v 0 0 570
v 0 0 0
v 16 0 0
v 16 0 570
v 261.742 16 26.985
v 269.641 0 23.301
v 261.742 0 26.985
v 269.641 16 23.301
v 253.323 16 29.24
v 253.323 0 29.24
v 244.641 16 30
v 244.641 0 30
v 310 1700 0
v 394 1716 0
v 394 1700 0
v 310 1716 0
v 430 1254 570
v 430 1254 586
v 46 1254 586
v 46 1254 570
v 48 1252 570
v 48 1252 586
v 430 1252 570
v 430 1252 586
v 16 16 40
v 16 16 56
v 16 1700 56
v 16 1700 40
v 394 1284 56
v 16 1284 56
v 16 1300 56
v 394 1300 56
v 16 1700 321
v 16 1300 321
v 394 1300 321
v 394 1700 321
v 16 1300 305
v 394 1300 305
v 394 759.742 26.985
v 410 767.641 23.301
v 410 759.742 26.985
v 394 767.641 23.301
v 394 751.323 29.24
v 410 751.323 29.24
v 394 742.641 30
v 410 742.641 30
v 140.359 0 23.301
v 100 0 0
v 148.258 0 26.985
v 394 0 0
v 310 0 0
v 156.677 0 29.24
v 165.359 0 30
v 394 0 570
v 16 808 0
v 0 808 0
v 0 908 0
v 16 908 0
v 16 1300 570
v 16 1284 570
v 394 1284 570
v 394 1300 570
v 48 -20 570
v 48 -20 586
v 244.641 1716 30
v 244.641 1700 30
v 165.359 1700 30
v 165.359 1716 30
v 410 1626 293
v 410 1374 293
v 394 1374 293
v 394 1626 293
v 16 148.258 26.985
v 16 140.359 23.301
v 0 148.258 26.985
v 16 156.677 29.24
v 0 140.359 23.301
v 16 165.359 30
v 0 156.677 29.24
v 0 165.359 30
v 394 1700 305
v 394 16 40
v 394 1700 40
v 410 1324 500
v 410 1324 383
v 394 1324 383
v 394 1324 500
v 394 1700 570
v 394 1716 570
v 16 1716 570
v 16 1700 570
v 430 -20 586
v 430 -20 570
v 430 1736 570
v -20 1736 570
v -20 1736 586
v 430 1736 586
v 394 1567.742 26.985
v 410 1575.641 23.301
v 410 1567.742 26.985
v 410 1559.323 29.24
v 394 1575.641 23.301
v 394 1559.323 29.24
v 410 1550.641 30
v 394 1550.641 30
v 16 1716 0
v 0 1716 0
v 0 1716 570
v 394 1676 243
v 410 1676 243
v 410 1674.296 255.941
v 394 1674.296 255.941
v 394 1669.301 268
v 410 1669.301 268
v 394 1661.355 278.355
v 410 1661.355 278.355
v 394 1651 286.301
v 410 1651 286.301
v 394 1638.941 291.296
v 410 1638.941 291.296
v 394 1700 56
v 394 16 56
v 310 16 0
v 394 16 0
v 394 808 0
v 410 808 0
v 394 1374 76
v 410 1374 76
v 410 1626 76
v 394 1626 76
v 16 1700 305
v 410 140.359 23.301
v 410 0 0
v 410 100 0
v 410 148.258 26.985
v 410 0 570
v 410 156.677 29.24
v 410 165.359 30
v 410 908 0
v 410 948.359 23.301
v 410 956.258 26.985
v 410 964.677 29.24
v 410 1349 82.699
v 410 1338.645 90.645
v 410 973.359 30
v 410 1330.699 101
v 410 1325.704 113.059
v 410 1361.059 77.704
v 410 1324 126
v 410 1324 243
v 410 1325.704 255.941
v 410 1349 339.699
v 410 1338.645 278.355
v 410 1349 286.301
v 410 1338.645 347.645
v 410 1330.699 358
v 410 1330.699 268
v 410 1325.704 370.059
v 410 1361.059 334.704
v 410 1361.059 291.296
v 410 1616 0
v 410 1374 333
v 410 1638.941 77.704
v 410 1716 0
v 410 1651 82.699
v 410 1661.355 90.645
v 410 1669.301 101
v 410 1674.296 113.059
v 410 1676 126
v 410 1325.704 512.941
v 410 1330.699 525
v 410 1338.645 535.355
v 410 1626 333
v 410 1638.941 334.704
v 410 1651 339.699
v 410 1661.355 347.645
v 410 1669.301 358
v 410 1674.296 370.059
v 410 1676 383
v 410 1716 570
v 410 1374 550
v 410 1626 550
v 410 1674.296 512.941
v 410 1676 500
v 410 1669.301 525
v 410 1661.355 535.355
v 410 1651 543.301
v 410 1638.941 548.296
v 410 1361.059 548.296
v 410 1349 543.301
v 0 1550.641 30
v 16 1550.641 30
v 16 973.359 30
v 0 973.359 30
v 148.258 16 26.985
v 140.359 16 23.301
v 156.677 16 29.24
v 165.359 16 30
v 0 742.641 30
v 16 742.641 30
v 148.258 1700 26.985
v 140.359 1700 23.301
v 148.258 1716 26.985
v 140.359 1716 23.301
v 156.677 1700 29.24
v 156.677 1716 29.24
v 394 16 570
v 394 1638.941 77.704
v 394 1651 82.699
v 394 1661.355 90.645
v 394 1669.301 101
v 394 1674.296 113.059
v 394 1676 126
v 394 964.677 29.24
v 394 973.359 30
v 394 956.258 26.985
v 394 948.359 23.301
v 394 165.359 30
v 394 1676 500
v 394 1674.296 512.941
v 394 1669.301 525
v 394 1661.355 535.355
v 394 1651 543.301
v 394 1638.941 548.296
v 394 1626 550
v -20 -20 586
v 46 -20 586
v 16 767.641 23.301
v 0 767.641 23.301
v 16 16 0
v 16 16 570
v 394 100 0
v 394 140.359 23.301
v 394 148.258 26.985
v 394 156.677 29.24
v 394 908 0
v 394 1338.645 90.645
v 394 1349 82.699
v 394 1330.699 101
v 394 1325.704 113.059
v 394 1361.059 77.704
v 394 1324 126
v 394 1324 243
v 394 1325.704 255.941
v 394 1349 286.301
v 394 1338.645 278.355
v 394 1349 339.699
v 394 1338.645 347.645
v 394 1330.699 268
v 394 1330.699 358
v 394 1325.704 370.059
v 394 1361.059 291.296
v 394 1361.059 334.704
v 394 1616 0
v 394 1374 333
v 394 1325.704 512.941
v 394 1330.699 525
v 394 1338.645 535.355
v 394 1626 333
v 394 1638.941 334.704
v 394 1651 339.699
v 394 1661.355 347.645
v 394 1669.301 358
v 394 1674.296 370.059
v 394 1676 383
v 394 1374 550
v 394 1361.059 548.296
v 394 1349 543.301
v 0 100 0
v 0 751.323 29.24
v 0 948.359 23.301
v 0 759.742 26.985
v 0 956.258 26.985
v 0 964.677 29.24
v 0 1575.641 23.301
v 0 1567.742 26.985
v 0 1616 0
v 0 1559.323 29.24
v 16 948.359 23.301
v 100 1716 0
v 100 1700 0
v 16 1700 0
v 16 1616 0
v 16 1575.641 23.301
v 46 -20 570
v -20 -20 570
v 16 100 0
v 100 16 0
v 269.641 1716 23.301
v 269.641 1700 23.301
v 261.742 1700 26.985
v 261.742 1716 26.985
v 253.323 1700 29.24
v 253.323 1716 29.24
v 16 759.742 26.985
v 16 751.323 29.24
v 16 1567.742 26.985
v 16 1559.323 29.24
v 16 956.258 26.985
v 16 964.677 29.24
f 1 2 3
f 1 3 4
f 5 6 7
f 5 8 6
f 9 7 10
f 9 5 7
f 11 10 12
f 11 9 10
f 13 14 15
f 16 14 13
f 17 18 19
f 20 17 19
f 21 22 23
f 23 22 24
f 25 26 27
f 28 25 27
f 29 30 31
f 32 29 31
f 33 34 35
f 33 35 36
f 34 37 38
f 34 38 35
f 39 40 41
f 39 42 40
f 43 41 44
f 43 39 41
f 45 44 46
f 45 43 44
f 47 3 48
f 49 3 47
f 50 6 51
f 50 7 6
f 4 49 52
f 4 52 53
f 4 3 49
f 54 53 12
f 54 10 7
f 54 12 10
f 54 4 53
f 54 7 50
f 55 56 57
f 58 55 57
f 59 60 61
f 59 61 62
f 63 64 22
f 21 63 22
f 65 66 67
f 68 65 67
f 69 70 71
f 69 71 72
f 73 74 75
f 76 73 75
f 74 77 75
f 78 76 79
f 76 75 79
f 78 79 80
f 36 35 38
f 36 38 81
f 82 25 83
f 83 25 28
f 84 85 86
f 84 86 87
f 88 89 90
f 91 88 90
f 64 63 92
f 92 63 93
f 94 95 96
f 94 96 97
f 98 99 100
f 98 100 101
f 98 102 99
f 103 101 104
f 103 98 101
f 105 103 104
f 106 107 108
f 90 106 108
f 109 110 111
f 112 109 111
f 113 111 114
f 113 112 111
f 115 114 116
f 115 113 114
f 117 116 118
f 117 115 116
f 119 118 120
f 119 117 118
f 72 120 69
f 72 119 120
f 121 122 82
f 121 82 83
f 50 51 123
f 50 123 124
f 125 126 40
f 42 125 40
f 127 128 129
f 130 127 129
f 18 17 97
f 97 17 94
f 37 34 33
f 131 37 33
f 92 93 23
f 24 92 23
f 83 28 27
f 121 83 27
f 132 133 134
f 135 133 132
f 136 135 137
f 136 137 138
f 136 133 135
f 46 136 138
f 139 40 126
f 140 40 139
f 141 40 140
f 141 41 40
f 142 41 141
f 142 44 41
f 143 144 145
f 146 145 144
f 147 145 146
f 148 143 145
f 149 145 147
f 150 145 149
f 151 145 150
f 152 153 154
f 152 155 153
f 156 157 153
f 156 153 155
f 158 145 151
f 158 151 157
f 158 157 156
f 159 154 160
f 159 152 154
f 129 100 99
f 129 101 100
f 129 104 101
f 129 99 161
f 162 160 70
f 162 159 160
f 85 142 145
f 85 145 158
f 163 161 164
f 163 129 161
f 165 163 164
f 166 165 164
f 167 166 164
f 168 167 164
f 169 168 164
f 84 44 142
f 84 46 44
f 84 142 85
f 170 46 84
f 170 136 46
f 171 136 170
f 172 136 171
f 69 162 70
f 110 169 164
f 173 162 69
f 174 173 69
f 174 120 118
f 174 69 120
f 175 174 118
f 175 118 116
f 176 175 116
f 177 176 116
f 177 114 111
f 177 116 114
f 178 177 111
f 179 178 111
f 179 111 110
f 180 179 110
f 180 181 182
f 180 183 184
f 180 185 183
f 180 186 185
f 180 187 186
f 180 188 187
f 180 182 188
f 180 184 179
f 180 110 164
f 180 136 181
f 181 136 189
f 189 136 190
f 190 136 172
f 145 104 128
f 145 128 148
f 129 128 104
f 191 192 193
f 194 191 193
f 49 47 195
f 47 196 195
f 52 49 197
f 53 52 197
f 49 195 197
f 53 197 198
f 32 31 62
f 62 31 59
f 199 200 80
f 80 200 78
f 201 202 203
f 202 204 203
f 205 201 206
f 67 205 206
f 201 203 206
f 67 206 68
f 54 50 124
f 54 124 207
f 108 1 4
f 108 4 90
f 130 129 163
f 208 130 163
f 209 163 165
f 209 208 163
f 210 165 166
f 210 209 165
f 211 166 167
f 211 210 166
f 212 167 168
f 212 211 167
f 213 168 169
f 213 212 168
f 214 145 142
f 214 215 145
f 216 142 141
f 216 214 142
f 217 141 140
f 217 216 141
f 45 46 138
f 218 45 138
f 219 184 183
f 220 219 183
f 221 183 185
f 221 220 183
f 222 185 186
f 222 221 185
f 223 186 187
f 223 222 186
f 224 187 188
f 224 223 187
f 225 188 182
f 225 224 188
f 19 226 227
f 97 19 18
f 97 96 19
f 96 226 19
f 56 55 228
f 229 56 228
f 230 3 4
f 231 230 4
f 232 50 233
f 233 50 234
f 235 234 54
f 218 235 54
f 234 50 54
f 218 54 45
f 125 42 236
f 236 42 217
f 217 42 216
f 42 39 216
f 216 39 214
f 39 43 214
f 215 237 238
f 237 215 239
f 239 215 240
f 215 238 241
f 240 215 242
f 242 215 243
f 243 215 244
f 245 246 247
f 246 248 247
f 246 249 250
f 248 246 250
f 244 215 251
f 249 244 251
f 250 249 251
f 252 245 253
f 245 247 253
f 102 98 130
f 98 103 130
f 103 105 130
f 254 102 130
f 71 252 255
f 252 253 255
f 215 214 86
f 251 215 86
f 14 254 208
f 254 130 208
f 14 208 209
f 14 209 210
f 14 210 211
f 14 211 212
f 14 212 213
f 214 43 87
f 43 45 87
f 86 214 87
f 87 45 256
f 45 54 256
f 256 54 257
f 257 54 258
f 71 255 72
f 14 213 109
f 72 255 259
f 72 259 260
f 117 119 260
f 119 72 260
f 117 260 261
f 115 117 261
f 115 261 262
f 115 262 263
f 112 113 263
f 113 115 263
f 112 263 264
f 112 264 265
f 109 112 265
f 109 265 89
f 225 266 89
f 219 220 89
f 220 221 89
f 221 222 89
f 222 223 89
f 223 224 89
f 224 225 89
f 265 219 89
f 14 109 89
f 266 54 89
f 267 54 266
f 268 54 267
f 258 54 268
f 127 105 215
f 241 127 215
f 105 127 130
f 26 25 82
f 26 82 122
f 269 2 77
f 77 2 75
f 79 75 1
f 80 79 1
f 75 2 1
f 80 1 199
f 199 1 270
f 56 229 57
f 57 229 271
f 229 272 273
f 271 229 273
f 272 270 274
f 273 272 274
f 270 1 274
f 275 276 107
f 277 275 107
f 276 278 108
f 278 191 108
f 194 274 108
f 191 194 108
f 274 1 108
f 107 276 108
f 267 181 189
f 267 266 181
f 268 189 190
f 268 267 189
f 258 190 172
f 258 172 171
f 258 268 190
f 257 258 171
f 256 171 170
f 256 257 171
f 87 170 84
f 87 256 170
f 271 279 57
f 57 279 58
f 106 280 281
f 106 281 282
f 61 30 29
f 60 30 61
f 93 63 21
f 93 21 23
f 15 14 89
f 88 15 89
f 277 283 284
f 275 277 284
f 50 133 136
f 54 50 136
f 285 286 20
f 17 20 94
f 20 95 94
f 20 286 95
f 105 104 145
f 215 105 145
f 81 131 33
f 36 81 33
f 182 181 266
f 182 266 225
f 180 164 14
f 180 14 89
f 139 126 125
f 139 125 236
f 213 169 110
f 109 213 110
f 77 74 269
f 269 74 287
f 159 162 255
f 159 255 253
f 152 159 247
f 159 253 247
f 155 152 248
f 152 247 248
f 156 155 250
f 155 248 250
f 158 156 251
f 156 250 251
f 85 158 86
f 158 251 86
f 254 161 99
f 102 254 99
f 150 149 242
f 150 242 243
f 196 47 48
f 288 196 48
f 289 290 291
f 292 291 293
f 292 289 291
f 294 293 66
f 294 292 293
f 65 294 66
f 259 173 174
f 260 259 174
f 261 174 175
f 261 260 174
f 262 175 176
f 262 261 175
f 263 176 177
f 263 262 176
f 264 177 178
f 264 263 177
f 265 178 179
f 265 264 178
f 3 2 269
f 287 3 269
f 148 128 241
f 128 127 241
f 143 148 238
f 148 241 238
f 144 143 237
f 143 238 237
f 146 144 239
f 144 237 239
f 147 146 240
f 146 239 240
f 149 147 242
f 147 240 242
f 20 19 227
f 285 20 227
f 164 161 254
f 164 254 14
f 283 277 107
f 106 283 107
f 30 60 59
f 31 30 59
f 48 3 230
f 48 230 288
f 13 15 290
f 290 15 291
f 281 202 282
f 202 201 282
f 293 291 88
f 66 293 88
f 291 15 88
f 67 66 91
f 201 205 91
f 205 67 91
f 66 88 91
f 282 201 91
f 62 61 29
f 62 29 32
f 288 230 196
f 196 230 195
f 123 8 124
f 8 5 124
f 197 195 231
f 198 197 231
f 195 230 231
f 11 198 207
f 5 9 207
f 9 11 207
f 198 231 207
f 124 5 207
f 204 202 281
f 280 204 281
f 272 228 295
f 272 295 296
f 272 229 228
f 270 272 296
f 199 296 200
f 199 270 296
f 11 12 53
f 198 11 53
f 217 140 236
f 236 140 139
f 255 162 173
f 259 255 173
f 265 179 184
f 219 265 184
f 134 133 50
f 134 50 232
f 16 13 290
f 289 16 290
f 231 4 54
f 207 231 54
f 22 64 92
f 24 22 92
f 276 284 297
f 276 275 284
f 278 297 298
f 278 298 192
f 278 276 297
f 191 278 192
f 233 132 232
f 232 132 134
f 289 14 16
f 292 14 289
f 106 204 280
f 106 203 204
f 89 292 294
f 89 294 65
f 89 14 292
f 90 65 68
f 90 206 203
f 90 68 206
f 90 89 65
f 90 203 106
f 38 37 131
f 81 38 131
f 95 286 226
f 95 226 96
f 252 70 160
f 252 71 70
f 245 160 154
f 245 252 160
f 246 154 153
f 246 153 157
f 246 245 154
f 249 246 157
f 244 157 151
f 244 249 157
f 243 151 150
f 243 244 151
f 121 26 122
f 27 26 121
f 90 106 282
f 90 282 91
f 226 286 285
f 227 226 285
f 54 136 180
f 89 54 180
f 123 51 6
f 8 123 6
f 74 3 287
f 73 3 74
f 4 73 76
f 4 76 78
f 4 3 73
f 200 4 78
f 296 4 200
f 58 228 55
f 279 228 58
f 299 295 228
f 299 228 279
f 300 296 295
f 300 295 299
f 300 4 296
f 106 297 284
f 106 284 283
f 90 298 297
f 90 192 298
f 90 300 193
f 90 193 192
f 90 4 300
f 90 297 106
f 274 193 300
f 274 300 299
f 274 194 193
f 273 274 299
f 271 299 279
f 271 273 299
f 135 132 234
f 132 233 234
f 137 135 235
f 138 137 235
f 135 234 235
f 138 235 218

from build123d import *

# Parameters (mm, degrees)
F0_W      = 1716
F0_H      = 570
F1_DEPTH  = 16
F3_W      = 1716
F3_H      = 570
F4_DEPTH  = 16
F5_W      = 378
F5_H      = 570
F6_DEPTH  = 16
F7_W      = 378
F7_H      = 570
F8_DEPTH  = 16
F9_W      = 450
F9_H      = 1756
F9_W_2    = 16
F9_H_2    = 1716
F10_DEPTH = 16
F11_W     = 1684
F11_H     = 16
F12_DEPTH = 378
F13_W     = 16
F13_H     = 514
F14_DEPTH = 378
F15_W     = 400
F15_H     = 16
F16_DEPTH = 378
F18_DEPTH = 410
F20_DEPTH = 1716
F21_R     = 50
F21_2_R   = 50
F21_3_R   = 50
F21_4_R   = 50
F22_W     = 352
F22_H     = 217
F23_DEPTH = 16
F24_R     = 50
F26_DEPTH = 16
F27_W     = 16
F27_H     = 60
F28_DEPTH = 16


with BuildPart() as f1:
    # F0 (on Right) → F1 (new body)
    with BuildSketch(Plane.YZ):
        with Locations((858, 285)):
            Rectangle(F0_W, F0_H)
    extrude(amount=F1_DEPTH)


with BuildPart() as f4:
    # F3 (on offset) → F4 (new body)
    with BuildSketch(Plane.YZ.offset(410)):
        with Locations((858, 285)):
            Rectangle(F3_W, F3_H)
    extrude(amount=-F4_DEPTH)


with BuildPart() as f6:
    # F5 (on Front) → F6 (new body)
    with BuildSketch(Plane.XZ):
        with Locations((205, 285)):
            Rectangle(F5_W, F5_H)
    extrude(amount=-F6_DEPTH)


with BuildPart() as f8:
    # F7 (on face) → F8 (new body)
    with BuildSketch(Plane(origin=(0, 1716, 0), x_dir=(-1, 0, 0), z_dir=(0, 1, 0))):
        with Locations((-205, 285)):
            Rectangle(F7_W, F7_H)
    extrude(amount=-F8_DEPTH)


with BuildPart() as f10:
    # F9 (on face) → F10 (new body)
    with BuildSketch(Plane.XY.offset(570)):
        with Locations((205, 858)):
            Rectangle(F9_W, F9_H)
        with Locations((8, 858)):
            Rectangle(F9_W_2, F9_H_2, mode=Mode.SUBTRACT)
        with Locations((8, 858)):
            Rectangle(F9_W_2, F9_H_2)
    extrude(amount=F10_DEPTH)

    # F25 (on face) → F26 (cut, through all)
    with BuildSketch(Plane.XY.offset(586)):
        Polygon((430, 1252), (430, 1254), (46, 1254), (46, -20), (48, -20), (48, 1252), align=None)
    extrude(amount=-F26_DEPTH, mode=Mode.SUBTRACT)


with BuildPart() as f12:
    # F11 (on face) → F12 (new body, through all)
    with BuildSketch(Plane.YZ.offset(16)):
        with Locations((858, 48)):
            Rectangle(F11_W, F11_H)
    extrude(amount=F12_DEPTH)


with BuildPart() as f14:
    # F13 (on face) → F14 (new body, through all)
    with BuildSketch(Plane.YZ.offset(16)):
        with Locations((1292, 313)):
            Rectangle(F13_W, F13_H)
    extrude(amount=F14_DEPTH)


with BuildPart() as f16:
    # F15 (on face) → F16 (new body, through all)
    with BuildSketch(Plane.YZ.offset(16)):
        with Locations((1500, 313)):
            Rectangle(F15_W, F15_H)
    extrude(amount=F16_DEPTH)


with BuildPart() as f18_tool:
    # F17 (on face) → F18 (new body, through all)
    with BuildSketch(Plane.YZ.offset(410)):
        Polygon((151.9615242271, 30), (100, 0), (808, 0), (756.0384757729, 30), align=None)
        Polygon((908, 0), (1616, 0), (1564.0384757729, 30), (959.9615242271, 30), align=None)
    extrude(amount=-F18_DEPTH)


with BuildPart() as f1_1:
    add(f1.part)

    # F18: cut by f18_tool
    add(f18_tool.part, mode=Mode.SUBTRACT)

    # F21#2
    f21_2_edges = [f1_1.edges().sort_by_distance(p)[0] for p in [
        (8, 151.961524, 30),
        (8, 1564.038476, 30),
        (8, 756.038476, 30),
        (8, 959.961524, 30),
    ]]
    fillet(f21_2_edges, radius=F21_2_R)



with BuildPart() as f4_1:
    add(f4.part)

    # F18: cut by f18_tool
    add(f18_tool.part, mode=Mode.SUBTRACT)

    # F21
    f21_edges = [f4_1.edges().sort_by_distance(p)[0] for p in [
        (402, 151.961524, 30),
        (402, 1564.038476, 30),
        (402, 756.038476, 30),
        (402, 959.961524, 30),
    ]]
    fillet(f21_edges, radius=F21_R)

    # F22 (on face) → F23 (cut, through all)
    with BuildSketch(Plane.YZ.offset(410)):
        with Locations((1500, 441.5)):
            Rectangle(F22_W, F22_H)
        with Locations((1500, 184.5)):
            Rectangle(F22_W, F22_H)
    extrude(amount=-F23_DEPTH, mode=Mode.SUBTRACT)

    # F24
    f24_edges = [f4_1.edges().sort_by_distance(p)[0] for p in [
        (402, 1676, 333),
        (402, 1676, 76),
        (402, 1676, 293),
        (402, 1676, 550),
        (402, 1324, 550),
        (402, 1324, 293),
        (402, 1324, 333),
        (402, 1324, 76),
    ]]
    fillet(f24_edges, radius=F24_R)


with BuildPart() as f20_tool:
    # F19 (on face) → F20 (new body, through all)
    with BuildSketch(Plane.XZ):
        Polygon((151.9615242271, 30), (100, 0), (310, 0), (258.0384757729, 30), align=None)
    extrude(amount=-F20_DEPTH)


with BuildPart() as f6_1:
    add(f6.part)

    # F20: cut by f20_tool
    add(f20_tool.part, mode=Mode.SUBTRACT)

    # F21#4
    f21_4_edges = [f6_1.edges().sort_by_distance(p)[0] for p in [
        (258.038476, 8, 30),
        (151.961524, 8, 30),
    ]]
    fillet(f21_4_edges, radius=F21_4_R)


with BuildPart() as f8_1:
    add(f8.part)

    # F20: cut by f20_tool
    add(f20_tool.part, mode=Mode.SUBTRACT)

    # F21#3
    f21_3_edges = [f8_1.edges().sort_by_distance(p)[0] for p in [
        (151.961524, 1708, 30),
        (258.038476, 1708, 30),
    ]]
    fillet(f21_3_edges, radius=F21_3_R)


with BuildPart() as f1_2:
    add(f1_1.part)

    add(f4_1.part)  # F28 merges F4
    # F27 (on face) → F28 (join, through all)
    with BuildSketch(Plane.XZ):
        with Locations((402, 474)):
            Rectangle(F27_W, F27_H)
        with Locations((402, 348)):
            Rectangle(F27_W, F27_H)
        with Locations((402, 222)):
            Rectangle(F27_W, F27_H)
        with Locations((402, 96)):
            Rectangle(F27_W, F27_H)
        with Locations((8, 96)):
            Rectangle(F27_W, F27_H)
        with Locations((8, 474)):
            Rectangle(F27_W, F27_H)
        with Locations((8, 222)):
            Rectangle(F27_W, F27_H)
        with Locations((8, 348)):
            Rectangle(F27_W, F27_H)
    extrude(amount=-F28_DEPTH)


solid = Compound([f10.part, f12.part, f14.part, f16.part, f6_1.part, f8_1.part, f1_2.part])
